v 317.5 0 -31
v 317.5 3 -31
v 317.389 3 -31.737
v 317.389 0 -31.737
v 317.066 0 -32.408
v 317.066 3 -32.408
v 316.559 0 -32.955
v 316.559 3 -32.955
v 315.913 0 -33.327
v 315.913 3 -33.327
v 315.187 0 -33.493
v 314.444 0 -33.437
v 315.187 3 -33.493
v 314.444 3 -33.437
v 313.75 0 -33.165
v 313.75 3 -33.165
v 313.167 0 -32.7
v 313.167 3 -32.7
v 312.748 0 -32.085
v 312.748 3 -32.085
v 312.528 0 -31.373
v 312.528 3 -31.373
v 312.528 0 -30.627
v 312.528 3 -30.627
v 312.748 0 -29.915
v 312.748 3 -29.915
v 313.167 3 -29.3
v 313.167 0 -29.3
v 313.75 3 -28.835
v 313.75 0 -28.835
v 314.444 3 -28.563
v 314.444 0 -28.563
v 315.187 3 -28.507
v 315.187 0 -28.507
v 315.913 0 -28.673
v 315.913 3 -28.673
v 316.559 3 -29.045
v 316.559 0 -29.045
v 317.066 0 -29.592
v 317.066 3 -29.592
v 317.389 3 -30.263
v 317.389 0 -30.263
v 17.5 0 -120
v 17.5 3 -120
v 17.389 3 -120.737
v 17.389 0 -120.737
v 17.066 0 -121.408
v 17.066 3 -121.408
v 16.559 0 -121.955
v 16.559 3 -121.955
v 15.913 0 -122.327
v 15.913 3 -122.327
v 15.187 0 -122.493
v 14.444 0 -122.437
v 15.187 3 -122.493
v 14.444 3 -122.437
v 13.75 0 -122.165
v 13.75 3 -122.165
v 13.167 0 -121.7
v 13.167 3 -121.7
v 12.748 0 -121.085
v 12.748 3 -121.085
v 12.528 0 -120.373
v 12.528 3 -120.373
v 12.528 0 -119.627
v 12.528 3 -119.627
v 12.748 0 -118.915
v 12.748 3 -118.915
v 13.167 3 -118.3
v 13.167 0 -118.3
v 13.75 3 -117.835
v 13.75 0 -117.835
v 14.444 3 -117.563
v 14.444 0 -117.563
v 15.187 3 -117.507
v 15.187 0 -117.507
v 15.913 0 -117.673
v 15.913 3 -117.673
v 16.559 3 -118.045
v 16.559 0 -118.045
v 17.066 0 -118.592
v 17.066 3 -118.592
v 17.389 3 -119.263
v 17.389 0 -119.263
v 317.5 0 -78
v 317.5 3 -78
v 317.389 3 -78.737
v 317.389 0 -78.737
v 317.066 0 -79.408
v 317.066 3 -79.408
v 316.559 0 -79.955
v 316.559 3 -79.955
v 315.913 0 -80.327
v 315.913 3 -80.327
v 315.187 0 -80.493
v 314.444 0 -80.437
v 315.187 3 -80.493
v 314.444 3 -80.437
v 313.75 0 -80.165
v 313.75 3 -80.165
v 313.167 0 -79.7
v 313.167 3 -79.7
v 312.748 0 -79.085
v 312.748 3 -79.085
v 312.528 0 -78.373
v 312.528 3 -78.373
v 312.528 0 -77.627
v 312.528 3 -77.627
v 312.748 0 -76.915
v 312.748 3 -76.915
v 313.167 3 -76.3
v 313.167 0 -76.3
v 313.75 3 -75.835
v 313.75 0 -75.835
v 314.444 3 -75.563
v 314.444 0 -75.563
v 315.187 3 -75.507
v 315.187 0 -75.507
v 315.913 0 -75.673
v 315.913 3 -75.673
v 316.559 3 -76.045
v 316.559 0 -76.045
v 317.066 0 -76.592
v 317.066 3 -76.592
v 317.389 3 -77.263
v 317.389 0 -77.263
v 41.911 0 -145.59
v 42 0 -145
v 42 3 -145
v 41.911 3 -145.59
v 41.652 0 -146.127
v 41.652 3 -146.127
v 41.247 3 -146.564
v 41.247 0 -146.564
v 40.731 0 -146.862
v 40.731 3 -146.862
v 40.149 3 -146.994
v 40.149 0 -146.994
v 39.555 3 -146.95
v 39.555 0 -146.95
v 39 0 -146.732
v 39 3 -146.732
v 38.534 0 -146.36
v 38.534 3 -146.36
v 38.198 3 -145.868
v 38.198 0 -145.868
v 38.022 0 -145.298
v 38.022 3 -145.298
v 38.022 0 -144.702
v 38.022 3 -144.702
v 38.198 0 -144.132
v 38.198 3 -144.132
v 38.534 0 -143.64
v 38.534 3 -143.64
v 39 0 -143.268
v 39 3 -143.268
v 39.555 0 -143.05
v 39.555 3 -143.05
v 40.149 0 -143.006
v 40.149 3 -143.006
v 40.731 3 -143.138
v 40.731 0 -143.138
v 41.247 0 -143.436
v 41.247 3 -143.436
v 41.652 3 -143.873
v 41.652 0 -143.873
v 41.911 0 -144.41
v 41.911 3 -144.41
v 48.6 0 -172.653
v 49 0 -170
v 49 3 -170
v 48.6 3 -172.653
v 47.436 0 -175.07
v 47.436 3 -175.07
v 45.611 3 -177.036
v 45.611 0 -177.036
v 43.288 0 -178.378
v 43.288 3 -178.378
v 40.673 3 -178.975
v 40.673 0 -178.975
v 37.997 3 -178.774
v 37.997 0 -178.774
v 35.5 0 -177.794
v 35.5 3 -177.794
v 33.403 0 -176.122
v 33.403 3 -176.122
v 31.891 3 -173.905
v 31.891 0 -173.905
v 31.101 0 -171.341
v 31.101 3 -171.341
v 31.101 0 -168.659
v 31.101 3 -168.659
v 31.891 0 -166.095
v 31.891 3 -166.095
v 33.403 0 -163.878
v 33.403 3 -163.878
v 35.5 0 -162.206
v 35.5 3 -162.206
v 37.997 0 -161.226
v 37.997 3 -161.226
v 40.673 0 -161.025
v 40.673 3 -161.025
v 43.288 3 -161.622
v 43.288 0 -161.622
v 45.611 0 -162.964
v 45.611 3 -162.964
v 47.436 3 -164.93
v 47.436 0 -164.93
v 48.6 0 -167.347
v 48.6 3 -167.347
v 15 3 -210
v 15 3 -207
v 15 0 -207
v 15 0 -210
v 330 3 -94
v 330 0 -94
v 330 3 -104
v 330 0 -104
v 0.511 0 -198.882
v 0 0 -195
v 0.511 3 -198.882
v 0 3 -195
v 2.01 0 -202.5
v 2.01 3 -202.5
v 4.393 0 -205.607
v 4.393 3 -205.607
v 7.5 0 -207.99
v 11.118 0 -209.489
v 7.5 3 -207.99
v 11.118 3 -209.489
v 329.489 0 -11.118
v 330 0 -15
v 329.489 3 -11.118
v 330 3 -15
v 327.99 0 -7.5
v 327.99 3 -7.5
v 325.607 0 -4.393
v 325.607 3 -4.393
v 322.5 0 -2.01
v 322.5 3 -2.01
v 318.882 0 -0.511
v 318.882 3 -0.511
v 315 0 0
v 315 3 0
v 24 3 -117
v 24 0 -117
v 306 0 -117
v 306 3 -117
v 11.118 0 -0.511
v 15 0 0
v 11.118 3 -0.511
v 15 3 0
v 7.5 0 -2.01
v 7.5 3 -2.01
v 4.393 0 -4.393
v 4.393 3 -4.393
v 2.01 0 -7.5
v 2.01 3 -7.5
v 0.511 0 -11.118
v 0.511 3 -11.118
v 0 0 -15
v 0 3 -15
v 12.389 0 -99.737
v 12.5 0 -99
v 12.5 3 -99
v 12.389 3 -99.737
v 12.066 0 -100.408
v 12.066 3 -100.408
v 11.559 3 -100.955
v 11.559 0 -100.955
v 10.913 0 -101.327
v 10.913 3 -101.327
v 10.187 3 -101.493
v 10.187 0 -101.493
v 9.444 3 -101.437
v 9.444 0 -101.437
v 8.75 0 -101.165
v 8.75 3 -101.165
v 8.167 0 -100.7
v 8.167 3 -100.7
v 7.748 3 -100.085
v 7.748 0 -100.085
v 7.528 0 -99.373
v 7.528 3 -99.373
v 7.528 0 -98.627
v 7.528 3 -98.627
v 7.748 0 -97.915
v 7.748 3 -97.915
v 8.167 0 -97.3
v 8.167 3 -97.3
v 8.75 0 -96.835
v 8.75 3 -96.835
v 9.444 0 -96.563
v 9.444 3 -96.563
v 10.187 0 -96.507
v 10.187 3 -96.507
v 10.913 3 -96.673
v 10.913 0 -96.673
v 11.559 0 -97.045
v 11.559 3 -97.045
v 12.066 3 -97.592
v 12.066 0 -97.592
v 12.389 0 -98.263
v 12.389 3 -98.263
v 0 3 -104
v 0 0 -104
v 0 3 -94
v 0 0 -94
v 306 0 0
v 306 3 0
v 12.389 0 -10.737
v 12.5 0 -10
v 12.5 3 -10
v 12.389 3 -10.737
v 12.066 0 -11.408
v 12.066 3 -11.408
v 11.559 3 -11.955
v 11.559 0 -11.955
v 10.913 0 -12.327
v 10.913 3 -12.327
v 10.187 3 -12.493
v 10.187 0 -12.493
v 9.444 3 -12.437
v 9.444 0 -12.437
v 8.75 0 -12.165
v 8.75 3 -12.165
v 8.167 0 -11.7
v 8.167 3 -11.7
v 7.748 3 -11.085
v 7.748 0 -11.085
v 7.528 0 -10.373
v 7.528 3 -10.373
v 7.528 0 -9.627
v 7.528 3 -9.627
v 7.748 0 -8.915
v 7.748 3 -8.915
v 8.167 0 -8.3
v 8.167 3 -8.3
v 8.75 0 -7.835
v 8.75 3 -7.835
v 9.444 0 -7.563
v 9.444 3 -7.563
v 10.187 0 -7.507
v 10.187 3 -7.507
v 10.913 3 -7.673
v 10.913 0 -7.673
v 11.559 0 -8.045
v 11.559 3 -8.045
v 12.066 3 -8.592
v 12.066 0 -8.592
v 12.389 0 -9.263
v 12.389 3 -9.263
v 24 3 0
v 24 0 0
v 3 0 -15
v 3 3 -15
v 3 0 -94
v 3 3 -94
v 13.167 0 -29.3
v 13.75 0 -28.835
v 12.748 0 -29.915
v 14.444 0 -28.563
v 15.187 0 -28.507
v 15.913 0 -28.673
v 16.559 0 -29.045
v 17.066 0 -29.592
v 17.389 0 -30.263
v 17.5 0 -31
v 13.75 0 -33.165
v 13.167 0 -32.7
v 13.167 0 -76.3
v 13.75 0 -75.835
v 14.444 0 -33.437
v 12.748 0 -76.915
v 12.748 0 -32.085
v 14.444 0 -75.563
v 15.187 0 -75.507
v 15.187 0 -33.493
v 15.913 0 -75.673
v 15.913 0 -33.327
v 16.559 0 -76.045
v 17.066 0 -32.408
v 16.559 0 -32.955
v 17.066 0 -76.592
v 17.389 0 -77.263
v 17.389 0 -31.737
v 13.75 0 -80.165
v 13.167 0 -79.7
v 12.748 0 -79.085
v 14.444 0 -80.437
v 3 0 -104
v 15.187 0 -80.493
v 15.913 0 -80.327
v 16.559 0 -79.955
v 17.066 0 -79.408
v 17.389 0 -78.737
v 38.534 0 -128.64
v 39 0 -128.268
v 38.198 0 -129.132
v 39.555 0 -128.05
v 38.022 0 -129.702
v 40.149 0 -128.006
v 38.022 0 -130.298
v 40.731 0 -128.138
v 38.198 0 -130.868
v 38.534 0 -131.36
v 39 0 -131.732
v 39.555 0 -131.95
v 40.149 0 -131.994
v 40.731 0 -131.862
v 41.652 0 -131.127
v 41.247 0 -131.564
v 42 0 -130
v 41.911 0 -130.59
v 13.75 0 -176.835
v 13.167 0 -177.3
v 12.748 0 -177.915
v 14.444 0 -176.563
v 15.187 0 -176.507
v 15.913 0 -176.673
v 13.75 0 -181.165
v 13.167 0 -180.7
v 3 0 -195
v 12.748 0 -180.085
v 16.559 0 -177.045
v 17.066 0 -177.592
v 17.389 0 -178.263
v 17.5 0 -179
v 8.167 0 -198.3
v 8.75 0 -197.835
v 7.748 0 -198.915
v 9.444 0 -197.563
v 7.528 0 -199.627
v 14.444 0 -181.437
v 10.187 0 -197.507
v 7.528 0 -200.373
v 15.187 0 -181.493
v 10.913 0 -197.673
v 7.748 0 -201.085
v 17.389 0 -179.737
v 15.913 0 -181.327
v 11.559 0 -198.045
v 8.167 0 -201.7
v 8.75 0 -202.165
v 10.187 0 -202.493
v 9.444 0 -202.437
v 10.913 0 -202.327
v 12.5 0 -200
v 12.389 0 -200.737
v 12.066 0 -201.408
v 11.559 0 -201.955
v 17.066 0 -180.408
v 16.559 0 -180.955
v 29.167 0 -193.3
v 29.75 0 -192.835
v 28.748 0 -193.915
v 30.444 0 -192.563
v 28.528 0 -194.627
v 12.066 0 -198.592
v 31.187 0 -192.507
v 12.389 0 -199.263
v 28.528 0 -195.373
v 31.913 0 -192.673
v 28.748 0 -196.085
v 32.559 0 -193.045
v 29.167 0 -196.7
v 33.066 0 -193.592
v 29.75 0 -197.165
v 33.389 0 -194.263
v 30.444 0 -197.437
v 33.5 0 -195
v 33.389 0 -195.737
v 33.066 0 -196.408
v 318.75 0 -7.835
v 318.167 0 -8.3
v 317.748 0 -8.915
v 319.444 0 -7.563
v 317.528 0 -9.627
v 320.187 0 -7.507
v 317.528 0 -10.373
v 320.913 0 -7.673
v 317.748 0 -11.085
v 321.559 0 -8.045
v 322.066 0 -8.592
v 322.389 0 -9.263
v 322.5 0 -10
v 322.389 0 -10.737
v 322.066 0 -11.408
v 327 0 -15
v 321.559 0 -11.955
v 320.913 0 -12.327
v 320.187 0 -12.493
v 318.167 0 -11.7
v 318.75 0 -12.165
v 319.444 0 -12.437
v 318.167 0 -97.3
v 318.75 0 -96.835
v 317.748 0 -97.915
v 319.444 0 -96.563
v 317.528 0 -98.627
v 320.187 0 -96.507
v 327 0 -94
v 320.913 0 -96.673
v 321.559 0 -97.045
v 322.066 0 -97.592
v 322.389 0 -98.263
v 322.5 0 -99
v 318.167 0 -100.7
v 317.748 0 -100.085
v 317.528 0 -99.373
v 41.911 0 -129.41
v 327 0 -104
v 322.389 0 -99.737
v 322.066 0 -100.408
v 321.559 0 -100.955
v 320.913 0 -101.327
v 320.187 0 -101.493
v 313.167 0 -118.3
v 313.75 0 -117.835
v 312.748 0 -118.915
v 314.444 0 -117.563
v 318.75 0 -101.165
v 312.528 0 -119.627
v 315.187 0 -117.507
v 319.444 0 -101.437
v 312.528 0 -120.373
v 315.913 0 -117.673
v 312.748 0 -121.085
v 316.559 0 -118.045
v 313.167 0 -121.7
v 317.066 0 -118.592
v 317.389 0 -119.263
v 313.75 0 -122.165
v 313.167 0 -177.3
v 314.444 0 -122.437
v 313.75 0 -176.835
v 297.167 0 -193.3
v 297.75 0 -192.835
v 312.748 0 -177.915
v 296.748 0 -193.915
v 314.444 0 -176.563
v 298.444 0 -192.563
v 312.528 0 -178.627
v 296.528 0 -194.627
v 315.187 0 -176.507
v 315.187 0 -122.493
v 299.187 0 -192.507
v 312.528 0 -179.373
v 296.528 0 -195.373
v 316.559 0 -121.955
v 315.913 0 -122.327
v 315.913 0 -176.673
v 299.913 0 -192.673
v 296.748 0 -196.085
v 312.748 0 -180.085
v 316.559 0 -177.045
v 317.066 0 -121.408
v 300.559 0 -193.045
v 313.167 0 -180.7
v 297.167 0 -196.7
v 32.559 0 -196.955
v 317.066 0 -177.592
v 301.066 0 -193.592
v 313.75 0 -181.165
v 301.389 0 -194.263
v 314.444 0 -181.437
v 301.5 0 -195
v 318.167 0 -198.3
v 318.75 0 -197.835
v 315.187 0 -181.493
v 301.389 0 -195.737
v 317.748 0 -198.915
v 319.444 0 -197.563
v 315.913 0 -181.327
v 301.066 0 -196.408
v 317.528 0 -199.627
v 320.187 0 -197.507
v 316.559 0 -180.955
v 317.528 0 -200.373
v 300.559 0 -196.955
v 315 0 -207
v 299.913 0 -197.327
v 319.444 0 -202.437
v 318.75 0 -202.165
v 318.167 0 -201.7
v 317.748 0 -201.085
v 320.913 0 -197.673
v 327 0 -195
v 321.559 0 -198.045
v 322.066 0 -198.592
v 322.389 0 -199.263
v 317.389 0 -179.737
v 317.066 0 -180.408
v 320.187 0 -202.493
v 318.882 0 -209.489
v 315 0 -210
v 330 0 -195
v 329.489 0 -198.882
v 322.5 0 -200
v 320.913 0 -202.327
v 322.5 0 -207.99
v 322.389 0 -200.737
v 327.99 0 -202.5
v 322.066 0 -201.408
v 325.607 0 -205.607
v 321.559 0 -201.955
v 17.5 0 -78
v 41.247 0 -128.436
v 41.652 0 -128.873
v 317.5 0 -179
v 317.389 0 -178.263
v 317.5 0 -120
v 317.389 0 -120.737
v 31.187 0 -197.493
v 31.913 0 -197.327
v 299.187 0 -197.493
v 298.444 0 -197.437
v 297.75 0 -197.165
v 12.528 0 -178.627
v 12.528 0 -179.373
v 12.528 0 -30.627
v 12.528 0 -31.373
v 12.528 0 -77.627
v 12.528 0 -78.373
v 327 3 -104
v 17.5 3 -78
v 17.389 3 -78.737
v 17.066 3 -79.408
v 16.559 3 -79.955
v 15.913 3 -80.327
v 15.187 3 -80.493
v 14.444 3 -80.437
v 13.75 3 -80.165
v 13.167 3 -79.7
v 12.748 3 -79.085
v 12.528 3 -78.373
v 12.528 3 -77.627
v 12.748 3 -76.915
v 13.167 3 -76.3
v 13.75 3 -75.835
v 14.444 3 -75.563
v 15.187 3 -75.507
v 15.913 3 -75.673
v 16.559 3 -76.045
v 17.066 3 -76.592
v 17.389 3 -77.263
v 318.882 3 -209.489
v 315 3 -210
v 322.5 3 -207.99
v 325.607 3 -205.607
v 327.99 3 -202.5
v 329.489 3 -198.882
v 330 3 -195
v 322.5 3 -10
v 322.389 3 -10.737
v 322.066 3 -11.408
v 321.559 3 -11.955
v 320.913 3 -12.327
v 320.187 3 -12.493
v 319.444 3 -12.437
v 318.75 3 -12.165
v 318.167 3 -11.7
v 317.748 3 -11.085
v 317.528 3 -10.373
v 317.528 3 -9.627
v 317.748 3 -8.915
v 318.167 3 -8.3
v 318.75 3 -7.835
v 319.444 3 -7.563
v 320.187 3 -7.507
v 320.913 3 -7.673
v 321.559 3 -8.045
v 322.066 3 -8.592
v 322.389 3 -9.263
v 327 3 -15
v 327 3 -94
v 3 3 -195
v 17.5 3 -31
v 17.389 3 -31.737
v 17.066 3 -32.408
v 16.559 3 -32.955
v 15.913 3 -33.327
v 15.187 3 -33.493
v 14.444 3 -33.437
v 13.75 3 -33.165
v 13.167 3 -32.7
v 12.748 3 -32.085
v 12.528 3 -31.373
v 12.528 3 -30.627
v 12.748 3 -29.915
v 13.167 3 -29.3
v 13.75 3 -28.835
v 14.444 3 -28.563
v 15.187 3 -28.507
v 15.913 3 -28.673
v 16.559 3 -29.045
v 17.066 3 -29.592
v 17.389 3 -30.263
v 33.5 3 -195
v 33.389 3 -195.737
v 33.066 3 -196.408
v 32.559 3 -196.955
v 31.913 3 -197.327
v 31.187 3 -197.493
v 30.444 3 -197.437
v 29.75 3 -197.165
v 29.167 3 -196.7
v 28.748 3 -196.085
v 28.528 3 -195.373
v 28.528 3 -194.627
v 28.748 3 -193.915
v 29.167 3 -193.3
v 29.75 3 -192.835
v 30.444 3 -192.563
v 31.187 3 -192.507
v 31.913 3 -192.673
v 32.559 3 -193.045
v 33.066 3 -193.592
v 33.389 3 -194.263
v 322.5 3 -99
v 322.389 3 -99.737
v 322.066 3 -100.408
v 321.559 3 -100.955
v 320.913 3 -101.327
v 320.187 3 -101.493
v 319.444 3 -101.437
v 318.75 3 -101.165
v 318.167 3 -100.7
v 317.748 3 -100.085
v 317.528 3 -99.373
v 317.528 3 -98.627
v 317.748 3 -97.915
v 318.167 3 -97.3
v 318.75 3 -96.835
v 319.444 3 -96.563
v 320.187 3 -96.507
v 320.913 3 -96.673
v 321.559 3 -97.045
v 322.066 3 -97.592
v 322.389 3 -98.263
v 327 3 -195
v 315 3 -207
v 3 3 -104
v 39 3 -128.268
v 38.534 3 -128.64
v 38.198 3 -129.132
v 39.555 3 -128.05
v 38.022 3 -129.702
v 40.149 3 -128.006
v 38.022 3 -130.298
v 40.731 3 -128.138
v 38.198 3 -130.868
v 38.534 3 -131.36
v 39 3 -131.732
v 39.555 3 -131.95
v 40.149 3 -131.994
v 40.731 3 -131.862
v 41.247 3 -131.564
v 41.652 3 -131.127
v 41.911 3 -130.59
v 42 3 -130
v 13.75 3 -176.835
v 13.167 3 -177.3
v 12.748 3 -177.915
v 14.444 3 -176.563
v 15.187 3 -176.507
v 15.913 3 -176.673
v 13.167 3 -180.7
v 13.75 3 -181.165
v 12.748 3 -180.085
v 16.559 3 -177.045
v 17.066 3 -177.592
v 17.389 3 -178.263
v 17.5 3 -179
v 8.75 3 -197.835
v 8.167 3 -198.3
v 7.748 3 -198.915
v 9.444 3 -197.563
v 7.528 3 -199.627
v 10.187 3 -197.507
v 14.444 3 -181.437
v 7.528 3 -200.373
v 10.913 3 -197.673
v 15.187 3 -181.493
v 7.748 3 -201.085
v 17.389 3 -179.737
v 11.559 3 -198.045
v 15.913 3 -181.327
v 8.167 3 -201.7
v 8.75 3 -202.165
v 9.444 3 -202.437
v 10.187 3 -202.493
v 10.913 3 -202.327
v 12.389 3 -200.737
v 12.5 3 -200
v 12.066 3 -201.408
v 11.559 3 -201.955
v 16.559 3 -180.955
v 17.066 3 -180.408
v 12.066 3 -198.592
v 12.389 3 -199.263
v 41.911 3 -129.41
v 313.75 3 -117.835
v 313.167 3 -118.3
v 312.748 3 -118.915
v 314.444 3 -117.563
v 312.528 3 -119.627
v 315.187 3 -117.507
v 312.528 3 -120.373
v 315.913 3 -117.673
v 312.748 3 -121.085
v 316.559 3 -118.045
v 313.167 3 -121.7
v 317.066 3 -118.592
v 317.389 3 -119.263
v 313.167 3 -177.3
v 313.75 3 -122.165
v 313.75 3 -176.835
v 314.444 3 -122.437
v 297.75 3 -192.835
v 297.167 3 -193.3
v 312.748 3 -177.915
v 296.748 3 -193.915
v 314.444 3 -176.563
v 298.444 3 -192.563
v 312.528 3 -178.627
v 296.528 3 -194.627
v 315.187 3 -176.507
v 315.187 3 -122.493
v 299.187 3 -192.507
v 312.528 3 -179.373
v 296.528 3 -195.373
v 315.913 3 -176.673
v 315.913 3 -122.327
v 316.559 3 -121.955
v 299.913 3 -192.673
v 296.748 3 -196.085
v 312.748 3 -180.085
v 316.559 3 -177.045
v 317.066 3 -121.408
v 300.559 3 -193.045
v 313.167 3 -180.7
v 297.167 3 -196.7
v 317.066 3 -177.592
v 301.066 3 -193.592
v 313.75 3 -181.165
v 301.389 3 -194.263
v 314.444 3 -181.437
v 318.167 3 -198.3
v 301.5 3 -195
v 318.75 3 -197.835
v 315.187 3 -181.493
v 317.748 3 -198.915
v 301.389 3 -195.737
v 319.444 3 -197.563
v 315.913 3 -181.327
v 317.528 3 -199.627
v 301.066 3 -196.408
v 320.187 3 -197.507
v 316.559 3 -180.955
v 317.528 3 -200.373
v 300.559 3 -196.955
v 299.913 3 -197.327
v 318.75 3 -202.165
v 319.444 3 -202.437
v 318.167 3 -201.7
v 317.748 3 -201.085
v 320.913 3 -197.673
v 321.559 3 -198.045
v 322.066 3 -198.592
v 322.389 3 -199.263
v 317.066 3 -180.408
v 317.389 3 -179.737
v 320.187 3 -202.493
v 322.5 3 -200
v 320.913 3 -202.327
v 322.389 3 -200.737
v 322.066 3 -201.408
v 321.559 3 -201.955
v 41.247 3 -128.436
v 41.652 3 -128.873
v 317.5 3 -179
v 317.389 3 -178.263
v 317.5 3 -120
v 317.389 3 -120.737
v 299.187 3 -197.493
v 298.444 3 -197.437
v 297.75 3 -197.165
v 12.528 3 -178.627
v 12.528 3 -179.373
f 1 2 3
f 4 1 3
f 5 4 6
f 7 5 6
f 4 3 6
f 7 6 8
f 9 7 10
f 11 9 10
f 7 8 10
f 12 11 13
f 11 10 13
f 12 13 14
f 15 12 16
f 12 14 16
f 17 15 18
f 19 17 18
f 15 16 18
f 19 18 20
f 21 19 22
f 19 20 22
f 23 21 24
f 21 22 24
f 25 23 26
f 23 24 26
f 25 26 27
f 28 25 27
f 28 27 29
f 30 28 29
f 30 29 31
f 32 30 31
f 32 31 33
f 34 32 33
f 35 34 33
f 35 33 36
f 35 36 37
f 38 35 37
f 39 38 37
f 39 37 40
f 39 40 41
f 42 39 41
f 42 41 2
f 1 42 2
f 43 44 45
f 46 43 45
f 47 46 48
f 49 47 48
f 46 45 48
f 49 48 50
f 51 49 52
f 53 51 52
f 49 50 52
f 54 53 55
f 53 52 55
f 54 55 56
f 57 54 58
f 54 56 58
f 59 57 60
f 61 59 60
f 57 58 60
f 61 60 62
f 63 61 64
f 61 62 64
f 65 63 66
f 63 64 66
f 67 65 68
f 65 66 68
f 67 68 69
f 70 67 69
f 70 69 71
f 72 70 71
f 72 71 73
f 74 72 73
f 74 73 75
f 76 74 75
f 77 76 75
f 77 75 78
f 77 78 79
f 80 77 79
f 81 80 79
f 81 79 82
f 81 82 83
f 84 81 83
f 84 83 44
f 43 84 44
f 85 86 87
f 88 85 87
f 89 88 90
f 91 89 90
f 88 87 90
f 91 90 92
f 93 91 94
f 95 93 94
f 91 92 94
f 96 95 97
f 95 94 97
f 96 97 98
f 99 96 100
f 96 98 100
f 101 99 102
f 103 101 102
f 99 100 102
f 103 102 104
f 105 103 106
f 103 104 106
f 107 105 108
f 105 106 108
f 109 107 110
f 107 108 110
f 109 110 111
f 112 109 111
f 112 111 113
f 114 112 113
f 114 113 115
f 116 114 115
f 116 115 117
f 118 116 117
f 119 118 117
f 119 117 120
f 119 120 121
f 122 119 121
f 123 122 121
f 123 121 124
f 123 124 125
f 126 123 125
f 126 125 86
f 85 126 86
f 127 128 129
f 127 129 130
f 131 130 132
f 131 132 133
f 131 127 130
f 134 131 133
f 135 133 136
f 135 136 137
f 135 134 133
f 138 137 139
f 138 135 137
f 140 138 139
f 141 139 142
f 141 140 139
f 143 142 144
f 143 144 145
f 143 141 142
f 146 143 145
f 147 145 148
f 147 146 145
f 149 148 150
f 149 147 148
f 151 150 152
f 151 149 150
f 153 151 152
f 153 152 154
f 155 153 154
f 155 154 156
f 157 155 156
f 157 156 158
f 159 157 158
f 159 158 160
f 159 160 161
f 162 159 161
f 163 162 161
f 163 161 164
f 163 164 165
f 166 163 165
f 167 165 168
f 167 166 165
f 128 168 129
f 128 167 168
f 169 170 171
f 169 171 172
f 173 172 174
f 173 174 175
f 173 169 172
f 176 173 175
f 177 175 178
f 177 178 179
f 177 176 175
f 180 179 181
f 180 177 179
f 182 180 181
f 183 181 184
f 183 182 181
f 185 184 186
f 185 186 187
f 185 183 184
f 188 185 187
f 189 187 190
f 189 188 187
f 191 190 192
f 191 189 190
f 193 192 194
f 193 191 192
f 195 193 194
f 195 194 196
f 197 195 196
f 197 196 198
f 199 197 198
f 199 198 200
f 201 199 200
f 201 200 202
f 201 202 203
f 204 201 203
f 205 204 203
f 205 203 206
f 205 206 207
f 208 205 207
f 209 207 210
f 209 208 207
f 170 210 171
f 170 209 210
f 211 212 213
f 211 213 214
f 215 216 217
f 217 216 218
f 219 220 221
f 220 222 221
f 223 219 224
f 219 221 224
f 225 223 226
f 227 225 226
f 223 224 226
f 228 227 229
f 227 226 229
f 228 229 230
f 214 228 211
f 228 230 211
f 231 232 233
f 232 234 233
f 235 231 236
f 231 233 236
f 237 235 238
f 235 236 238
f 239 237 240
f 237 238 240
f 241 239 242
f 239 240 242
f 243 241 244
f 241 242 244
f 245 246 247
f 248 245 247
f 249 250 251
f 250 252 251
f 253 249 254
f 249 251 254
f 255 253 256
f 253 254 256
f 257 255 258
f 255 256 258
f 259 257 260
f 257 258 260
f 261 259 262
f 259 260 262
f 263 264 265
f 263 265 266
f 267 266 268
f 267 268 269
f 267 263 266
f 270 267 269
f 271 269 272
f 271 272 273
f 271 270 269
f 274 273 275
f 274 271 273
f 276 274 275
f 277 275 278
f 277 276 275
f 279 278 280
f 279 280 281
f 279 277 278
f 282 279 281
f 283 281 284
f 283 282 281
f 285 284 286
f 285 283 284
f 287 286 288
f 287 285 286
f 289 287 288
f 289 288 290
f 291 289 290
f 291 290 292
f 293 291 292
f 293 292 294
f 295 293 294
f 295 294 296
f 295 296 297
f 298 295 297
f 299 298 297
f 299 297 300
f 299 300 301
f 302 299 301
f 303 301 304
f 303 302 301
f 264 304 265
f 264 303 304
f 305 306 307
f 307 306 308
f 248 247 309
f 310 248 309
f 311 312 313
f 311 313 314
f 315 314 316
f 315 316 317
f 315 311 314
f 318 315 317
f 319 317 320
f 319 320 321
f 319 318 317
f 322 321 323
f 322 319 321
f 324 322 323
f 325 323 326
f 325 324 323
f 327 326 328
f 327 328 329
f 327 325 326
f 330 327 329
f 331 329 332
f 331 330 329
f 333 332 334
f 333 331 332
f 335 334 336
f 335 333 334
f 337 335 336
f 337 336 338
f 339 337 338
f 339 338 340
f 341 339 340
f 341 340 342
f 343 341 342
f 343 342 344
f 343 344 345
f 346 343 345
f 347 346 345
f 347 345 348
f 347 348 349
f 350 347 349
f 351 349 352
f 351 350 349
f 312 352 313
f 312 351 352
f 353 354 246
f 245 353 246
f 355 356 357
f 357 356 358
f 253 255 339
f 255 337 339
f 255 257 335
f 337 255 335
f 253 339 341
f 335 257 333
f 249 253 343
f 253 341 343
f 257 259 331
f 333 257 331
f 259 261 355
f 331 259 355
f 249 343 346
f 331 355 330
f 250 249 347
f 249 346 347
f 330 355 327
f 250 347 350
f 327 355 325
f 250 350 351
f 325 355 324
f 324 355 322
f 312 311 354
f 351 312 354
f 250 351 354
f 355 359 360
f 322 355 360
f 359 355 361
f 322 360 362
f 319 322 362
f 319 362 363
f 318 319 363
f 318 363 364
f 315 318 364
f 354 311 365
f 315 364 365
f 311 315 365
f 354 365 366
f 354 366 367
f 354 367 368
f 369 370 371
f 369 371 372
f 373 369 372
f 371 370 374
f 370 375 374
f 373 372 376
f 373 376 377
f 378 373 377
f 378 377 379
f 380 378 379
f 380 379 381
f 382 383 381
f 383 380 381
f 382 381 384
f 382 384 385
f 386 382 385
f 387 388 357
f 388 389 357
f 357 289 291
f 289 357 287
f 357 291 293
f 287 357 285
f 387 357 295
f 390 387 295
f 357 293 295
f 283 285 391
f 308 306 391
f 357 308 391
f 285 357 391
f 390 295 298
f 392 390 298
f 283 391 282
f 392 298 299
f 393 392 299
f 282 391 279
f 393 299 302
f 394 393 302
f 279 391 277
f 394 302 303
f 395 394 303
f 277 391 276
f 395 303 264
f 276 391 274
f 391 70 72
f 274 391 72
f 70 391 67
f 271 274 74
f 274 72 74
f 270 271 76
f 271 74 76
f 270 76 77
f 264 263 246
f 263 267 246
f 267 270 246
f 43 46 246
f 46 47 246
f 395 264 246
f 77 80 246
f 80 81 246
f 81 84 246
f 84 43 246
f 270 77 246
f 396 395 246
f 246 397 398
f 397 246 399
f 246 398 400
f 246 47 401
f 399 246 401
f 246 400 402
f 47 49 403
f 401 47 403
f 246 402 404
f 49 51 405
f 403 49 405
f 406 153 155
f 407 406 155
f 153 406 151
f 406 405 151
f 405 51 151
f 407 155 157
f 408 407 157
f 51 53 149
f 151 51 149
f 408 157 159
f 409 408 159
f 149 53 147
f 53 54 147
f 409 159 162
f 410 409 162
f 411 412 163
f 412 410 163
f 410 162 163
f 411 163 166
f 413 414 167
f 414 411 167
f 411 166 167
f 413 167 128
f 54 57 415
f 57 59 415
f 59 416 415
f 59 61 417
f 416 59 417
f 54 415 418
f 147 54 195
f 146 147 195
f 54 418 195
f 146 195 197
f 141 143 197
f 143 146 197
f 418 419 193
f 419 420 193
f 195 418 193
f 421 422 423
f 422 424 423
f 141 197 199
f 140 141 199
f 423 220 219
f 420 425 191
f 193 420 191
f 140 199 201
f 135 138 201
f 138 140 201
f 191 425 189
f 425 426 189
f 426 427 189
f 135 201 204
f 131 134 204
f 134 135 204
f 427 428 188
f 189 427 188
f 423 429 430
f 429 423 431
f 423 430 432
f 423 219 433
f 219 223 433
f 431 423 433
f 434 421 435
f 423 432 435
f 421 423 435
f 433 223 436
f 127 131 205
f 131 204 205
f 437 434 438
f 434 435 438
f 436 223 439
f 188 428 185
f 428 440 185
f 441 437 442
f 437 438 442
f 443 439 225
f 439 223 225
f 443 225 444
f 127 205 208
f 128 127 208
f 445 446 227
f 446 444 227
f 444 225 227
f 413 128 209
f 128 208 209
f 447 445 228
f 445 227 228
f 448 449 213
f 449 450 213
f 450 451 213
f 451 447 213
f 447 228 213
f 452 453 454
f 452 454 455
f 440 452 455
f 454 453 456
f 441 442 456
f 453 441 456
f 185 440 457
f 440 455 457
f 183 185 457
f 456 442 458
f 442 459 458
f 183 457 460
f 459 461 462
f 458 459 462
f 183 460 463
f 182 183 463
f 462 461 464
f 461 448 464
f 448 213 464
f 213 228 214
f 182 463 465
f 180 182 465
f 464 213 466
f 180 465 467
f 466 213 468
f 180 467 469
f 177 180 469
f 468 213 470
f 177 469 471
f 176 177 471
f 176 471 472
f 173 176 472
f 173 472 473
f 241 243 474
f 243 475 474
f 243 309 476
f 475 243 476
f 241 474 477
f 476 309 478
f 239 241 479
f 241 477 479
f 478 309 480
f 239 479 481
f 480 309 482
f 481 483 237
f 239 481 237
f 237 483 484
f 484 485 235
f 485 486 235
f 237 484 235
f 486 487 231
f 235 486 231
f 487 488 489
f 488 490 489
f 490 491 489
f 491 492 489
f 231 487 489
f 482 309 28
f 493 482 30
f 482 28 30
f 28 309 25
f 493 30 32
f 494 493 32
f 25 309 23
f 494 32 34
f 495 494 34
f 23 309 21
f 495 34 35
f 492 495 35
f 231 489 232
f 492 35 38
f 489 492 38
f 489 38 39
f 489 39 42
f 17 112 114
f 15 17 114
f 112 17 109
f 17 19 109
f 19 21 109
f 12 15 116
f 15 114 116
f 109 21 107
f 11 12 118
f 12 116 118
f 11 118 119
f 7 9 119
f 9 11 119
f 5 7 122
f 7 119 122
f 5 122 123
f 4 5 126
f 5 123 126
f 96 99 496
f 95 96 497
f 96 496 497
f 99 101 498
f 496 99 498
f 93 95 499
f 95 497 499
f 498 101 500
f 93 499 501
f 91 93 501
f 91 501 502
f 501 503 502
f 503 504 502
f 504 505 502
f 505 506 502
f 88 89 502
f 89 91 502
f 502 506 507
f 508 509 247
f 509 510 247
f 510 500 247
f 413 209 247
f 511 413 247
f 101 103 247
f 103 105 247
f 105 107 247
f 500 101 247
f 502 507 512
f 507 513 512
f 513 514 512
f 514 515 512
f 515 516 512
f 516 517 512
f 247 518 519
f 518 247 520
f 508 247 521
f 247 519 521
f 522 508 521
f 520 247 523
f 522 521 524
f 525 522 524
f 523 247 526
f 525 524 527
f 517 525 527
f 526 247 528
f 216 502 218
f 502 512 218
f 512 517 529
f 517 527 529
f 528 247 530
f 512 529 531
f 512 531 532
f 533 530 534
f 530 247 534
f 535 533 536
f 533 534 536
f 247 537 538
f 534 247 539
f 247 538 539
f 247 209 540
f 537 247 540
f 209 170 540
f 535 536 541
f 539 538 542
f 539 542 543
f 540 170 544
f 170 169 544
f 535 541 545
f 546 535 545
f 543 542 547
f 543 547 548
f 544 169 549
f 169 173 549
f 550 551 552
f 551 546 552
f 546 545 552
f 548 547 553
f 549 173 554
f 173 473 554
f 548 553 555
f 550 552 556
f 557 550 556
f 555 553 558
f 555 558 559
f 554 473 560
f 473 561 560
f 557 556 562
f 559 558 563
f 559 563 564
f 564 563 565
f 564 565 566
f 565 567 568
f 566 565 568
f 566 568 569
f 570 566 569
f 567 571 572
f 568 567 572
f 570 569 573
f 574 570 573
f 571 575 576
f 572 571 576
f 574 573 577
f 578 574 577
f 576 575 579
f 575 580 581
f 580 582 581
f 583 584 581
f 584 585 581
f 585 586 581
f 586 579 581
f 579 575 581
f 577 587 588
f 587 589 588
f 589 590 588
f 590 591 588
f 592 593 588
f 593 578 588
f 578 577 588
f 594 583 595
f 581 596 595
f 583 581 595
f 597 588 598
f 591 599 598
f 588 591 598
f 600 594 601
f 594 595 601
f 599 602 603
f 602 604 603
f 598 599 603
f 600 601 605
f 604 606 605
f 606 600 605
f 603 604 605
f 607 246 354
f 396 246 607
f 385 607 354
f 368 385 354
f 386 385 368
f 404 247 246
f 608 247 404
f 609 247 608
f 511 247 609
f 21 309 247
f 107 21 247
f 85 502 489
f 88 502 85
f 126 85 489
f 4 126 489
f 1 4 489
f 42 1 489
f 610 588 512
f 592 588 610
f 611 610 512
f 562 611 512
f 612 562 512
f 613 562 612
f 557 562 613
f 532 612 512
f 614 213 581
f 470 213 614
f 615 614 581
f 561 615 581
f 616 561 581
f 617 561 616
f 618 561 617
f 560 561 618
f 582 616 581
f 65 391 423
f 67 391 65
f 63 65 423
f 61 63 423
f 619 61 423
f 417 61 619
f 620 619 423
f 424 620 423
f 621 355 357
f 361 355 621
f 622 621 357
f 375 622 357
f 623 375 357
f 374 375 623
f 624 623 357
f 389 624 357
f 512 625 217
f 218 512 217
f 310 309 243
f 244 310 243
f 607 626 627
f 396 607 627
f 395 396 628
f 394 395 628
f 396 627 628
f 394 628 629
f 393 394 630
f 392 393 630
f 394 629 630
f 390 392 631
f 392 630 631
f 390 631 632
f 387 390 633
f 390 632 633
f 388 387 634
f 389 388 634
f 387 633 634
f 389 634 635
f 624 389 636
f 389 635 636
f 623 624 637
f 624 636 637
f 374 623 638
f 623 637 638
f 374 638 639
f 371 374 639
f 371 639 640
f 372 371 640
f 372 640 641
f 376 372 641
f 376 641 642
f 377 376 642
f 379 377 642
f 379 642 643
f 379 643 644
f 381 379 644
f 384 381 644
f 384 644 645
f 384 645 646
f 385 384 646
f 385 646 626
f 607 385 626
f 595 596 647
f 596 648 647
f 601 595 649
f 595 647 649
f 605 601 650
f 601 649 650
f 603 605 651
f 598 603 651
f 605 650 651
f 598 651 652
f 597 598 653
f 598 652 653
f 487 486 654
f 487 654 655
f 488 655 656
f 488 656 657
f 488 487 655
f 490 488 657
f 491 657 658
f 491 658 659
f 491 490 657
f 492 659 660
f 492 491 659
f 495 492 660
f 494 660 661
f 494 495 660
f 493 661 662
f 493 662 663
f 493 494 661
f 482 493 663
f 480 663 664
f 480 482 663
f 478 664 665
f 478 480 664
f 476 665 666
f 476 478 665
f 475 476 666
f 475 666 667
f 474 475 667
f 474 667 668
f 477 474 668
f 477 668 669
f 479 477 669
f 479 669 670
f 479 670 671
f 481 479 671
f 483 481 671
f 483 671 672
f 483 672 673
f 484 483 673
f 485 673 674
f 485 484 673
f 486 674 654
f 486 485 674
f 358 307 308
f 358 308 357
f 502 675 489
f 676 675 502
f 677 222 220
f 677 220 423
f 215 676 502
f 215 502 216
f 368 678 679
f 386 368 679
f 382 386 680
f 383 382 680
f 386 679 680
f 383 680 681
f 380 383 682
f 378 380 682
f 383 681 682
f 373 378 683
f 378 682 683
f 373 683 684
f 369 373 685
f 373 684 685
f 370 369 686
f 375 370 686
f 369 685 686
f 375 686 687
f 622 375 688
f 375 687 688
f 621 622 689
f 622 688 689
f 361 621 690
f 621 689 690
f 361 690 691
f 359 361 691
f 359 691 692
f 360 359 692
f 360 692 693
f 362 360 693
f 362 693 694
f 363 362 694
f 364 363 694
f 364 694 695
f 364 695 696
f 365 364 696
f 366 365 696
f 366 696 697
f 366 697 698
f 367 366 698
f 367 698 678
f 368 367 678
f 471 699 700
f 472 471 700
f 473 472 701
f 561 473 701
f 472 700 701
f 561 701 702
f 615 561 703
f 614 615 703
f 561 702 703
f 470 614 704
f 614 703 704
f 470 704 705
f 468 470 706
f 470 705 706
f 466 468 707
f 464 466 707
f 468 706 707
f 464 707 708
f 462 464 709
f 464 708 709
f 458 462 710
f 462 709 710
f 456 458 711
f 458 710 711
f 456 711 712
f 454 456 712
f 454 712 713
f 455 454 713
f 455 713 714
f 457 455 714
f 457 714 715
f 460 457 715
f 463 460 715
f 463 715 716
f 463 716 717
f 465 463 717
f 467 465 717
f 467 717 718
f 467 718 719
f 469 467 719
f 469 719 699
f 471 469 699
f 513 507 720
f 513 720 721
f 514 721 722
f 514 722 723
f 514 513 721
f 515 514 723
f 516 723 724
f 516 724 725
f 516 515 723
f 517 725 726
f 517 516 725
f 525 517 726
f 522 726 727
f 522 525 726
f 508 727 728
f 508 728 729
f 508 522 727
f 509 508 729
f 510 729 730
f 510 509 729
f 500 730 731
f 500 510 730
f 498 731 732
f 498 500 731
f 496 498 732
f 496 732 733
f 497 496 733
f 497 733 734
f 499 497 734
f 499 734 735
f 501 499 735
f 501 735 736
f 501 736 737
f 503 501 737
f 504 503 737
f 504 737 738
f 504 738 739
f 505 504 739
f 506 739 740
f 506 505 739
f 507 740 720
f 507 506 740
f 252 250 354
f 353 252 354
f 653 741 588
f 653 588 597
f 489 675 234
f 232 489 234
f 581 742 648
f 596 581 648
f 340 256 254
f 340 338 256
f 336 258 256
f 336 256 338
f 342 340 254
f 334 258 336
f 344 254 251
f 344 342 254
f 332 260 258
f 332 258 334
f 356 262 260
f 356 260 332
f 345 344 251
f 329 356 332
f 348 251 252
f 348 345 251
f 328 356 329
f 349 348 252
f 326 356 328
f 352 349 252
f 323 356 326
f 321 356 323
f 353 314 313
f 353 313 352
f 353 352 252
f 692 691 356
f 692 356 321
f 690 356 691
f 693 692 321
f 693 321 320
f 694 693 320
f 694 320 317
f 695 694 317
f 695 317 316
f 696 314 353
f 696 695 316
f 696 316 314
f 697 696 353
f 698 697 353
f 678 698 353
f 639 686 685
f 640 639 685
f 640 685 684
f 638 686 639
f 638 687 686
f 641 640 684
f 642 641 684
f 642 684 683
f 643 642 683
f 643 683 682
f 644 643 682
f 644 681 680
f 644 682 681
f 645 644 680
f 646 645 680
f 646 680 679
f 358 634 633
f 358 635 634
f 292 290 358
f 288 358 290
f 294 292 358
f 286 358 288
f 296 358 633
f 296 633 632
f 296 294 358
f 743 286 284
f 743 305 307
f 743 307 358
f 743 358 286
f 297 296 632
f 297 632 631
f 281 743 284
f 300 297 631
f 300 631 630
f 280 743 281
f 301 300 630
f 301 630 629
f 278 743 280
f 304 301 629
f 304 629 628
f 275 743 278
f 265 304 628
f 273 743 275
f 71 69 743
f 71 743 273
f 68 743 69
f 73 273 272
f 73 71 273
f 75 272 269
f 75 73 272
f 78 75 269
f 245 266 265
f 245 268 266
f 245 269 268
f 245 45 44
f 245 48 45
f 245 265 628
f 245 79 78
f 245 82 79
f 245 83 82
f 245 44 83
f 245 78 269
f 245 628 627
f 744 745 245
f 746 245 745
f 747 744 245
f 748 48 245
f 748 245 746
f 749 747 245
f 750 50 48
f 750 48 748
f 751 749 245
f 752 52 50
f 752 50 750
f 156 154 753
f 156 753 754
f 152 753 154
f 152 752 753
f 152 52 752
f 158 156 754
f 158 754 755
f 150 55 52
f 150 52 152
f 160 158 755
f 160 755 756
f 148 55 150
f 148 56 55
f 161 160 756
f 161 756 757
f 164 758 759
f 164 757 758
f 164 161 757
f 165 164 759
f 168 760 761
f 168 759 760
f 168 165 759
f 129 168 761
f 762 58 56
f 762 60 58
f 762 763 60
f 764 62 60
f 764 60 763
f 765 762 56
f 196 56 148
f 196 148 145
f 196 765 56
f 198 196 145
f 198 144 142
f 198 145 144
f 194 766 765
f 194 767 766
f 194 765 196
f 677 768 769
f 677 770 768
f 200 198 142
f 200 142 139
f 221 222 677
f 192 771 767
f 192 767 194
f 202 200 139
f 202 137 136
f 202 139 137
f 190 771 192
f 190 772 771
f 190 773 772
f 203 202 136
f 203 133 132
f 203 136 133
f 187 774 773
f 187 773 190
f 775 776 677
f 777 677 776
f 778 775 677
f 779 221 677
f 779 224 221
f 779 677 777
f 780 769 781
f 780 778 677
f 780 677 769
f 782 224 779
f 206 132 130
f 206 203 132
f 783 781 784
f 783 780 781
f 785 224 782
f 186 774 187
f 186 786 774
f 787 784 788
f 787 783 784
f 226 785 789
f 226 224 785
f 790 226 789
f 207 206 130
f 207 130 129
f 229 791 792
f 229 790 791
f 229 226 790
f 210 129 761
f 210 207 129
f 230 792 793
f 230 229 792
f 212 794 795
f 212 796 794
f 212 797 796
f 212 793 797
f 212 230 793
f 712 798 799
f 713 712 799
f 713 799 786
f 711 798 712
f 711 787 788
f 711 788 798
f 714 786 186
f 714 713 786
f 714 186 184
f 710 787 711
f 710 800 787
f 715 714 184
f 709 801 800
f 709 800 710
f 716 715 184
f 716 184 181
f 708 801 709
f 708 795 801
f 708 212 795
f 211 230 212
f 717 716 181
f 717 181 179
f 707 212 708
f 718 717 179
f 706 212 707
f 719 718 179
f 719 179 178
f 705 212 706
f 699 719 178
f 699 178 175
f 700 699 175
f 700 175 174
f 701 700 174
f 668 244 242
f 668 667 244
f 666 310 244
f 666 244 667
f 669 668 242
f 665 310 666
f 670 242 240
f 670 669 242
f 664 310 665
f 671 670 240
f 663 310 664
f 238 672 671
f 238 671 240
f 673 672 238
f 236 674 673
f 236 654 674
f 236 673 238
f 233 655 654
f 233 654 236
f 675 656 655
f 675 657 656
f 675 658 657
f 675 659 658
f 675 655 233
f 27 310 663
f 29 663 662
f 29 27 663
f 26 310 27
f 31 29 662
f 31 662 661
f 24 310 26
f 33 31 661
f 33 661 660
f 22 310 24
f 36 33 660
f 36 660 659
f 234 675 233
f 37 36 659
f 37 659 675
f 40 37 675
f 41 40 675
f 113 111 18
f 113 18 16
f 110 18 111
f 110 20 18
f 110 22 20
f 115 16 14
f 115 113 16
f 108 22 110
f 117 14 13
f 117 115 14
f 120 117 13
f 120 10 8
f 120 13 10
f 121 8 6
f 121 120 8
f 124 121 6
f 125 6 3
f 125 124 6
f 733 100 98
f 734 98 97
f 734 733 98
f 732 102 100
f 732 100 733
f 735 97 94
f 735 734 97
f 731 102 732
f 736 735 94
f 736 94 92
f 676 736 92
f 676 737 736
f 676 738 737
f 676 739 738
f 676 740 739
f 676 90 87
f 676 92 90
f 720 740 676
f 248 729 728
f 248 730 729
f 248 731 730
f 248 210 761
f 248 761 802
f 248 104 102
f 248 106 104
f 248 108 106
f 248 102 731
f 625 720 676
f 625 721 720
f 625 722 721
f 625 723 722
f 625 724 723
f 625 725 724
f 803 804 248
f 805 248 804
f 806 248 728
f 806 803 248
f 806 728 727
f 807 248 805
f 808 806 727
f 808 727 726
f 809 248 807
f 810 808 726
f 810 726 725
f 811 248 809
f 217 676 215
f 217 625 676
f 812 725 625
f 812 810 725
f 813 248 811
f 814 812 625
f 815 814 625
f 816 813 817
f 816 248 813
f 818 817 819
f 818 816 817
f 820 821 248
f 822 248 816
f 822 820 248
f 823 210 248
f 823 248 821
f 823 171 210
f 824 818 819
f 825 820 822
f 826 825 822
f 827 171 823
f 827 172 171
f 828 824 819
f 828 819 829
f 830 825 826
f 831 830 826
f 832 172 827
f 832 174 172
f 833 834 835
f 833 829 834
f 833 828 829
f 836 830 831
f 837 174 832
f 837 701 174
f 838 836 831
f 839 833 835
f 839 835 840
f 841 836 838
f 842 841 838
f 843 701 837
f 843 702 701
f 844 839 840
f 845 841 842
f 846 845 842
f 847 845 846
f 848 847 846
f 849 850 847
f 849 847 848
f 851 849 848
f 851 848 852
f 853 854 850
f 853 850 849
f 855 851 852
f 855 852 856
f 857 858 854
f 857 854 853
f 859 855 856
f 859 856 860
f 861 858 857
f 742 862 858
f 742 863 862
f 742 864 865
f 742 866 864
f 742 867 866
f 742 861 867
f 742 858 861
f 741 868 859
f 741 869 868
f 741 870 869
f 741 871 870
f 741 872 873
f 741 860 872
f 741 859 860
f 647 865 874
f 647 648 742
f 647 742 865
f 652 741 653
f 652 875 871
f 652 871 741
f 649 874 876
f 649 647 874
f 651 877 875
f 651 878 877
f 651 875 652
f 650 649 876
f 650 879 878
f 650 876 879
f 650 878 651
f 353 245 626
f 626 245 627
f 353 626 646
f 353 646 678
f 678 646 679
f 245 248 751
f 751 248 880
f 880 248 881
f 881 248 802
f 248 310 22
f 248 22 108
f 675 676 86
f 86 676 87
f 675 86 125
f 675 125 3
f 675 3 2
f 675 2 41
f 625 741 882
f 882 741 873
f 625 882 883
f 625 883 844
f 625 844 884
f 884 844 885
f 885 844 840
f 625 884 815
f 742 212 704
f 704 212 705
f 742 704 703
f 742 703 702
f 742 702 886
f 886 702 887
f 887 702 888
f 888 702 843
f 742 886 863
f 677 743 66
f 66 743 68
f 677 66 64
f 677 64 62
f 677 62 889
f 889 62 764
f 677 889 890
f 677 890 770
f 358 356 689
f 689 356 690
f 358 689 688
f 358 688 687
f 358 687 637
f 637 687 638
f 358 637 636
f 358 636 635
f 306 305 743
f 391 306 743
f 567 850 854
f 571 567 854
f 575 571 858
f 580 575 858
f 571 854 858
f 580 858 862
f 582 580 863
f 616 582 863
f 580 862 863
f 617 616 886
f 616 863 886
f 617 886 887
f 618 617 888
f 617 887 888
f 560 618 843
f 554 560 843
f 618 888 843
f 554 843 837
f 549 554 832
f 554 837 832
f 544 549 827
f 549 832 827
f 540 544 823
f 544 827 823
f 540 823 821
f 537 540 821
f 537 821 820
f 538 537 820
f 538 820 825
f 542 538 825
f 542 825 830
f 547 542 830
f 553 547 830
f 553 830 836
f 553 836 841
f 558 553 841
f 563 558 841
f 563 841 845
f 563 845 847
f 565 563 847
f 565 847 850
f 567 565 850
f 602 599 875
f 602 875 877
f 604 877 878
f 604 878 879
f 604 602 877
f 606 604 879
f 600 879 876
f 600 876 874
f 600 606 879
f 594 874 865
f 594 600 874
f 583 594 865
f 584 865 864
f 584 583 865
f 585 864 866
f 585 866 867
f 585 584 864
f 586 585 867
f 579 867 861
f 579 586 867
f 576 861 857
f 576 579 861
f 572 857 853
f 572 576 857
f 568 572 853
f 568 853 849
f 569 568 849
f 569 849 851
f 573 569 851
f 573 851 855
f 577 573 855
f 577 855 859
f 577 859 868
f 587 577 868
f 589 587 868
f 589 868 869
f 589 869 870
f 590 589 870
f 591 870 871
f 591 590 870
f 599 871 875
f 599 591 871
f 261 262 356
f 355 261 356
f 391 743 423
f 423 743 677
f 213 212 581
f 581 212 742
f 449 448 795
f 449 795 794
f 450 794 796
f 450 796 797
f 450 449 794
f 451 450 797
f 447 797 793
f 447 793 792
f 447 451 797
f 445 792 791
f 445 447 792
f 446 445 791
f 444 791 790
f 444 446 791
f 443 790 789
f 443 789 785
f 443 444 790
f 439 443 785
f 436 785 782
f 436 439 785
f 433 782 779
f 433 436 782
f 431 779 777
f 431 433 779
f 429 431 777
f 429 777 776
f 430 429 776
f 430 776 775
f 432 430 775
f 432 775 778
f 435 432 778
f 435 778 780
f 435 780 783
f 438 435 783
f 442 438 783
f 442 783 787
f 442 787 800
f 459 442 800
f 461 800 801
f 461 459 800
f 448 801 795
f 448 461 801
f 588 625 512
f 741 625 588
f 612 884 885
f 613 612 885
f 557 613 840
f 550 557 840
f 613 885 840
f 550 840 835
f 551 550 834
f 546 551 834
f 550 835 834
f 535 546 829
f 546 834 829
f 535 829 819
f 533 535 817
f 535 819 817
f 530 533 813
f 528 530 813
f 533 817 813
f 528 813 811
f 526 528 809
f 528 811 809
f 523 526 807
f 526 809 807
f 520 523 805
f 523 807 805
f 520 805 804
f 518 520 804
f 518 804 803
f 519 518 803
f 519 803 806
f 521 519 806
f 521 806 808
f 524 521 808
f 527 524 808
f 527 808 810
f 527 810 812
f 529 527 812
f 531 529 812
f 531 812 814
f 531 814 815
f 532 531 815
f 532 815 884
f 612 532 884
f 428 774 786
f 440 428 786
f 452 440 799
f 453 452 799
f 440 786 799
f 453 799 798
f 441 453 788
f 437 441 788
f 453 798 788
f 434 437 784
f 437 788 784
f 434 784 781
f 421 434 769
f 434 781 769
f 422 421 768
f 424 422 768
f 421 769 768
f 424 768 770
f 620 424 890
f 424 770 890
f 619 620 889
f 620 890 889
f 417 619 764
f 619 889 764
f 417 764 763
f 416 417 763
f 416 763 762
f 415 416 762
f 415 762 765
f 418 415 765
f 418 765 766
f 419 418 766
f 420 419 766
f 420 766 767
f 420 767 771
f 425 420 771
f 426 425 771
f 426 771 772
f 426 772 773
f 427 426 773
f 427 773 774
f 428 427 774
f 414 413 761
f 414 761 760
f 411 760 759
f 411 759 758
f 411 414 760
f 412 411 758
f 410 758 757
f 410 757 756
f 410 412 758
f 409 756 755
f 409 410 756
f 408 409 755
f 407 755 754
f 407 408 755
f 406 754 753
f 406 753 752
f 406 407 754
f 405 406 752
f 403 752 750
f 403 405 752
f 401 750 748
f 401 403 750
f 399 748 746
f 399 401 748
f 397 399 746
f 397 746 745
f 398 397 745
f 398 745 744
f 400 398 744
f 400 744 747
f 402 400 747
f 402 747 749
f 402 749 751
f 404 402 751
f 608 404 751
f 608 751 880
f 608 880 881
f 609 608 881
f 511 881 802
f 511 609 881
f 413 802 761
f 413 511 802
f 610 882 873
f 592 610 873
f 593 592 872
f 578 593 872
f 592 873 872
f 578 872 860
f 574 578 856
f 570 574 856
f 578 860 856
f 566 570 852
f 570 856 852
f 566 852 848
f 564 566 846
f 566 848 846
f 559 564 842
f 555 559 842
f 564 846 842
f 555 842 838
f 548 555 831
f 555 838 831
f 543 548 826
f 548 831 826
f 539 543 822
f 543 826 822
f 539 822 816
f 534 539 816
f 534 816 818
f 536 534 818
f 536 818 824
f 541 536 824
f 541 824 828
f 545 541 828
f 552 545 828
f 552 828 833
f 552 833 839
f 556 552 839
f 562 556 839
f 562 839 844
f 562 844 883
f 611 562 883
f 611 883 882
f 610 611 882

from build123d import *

# Parameters (mm, degrees)
ESQUISSE1_R      = 2.5
ESQUISSE1_R_2    = 9
ESQUISSE1_R_3    = 2
EXTRUSION1_DEPTH = 3
CONG_1_R         = 15
EXTRUSION2_REACH = 5
ESQUISSE2_W      = 300
ESQUISSE2_H      = 3
ESQUISSE2_W_2    = 3
ESQUISSE2_H_2    = 91
ESQUISSE2_H_3    = 79
EXTRUSION3_REACH = 5
ESQUISSE3_R      = 2.5


with BuildPart() as part:
    # Esquisse1 → Extrusion1 (new body)
    with BuildSketch(Plane(origin=(0, 0, 0), x_dir=(1, 0, 0), z_dir=(0, 1, 0))):
        Polygon((0, 0), (24, 0), (24, 117), (165, 117), (306, 117), (306, 0), (330, 0), (330, 210), (0, 210), align=None)
        with Locations((10, 200)):
            Circle(ESQUISSE1_R, mode=Mode.SUBTRACT)
        with Locations((320, 200)):
            Circle(ESQUISSE1_R, mode=Mode.SUBTRACT)
        with Locations((10, 99)):
            Circle(ESQUISSE1_R, mode=Mode.SUBTRACT)
        with Locations((320, 99)):
            Circle(ESQUISSE1_R, mode=Mode.SUBTRACT)
        with Locations((10, 10)):
            Circle(ESQUISSE1_R, mode=Mode.SUBTRACT)
        with Locations((320, 10)):
            Circle(ESQUISSE1_R, mode=Mode.SUBTRACT)
        with Locations((40, 170)):
            Circle(ESQUISSE1_R_2, mode=Mode.SUBTRACT)
        with Locations((40, 145)):
            Circle(ESQUISSE1_R_3, mode=Mode.SUBTRACT)
        with Locations((40, 130)):
            Circle(ESQUISSE1_R_3, mode=Mode.SUBTRACT)
    extrude(amount=EXTRUSION1_DEPTH)

    # Congé1
    cong_1_edges = [part.edges().sort_by_distance(p)[0] for p in [
        (0, 1.5, -210),
        (330, 1.5, -210),
        (330, 1.5, 0),
        (0, 1.5, 0),
    ]]
    fillet(cong_1_edges, radius=CONG_1_R)

    # Esquisse2 → Extrusion2 (cut, up to next)
    with BuildSketch(Plane(origin=(0, 3, 0), x_dir=(1, 0, 0), z_dir=(0, 1, 0)), mode=Mode.PRIVATE) as extrusion2_sk1:
        with Locations((165, 208.5)):
            Rectangle(ESQUISSE2_W, ESQUISSE2_H)
    extrusion2_tool1 = extrude(extrusion2_sk1.sketch, amount=-EXTRUSION2_REACH, mode=Mode.PRIVATE) & part.part
    add(extrusion2_tool1.solids().sort_by_distance((165, 3, -208.5))[0], mode=Mode.SUBTRACT)
    # Esquisse2 → Extrusion2 (cut, up to next)
    with BuildSketch(Plane(origin=(0, 3, 0), x_dir=(1, 0, 0), z_dir=(0, 1, 0)), mode=Mode.PRIVATE) as extrusion2_sk2:
        with Locations((1.5, 149.5)):
            Rectangle(ESQUISSE2_W_2, ESQUISSE2_H_2)
    extrusion2_tool2 = extrude(extrusion2_sk2.sketch, amount=-EXTRUSION2_REACH, mode=Mode.PRIVATE) & part.part
    add(extrusion2_tool2.solids().sort_by_distance((1.5, 3, -149.5))[0], mode=Mode.SUBTRACT)
    # Esquisse2 → Extrusion2 (cut, up to next)
    with BuildSketch(Plane(origin=(0, 3, 0), x_dir=(1, 0, 0), z_dir=(0, 1, 0)), mode=Mode.PRIVATE) as extrusion2_sk3:
        with Locations((1.5, 54.5)):
            Rectangle(ESQUISSE2_W_2, ESQUISSE2_H_3)
    extrusion2_tool3 = extrude(extrusion2_sk3.sketch, amount=-EXTRUSION2_REACH, mode=Mode.PRIVATE) & part.part
    add(extrusion2_tool3.solids().sort_by_distance((1.5, 3, -54.5))[0], mode=Mode.SUBTRACT)
    # Esquisse2 → Extrusion2 (cut, up to next)
    with BuildSketch(Plane(origin=(0, 3, 0), x_dir=(1, 0, 0), z_dir=(0, 1, 0)), mode=Mode.PRIVATE) as extrusion2_sk4:
        with Locations((328.5, 54.5)):
            Rectangle(ESQUISSE2_W_2, ESQUISSE2_H_3)
    extrusion2_tool4 = extrude(extrusion2_sk4.sketch, amount=-EXTRUSION2_REACH, mode=Mode.PRIVATE) & part.part
    add(extrusion2_tool4.solids().sort_by_distance((328.5, 3, -54.5))[0], mode=Mode.SUBTRACT)
    # Esquisse2 → Extrusion2 (cut, up to next)
    with BuildSketch(Plane(origin=(0, 3, 0), x_dir=(1, 0, 0), z_dir=(0, 1, 0)), mode=Mode.PRIVATE) as extrusion2_sk5:
        with Locations((328.5, 149.5)):
            Rectangle(ESQUISSE2_W_2, ESQUISSE2_H_2)
    extrusion2_tool5 = extrude(extrusion2_sk5.sketch, amount=-EXTRUSION2_REACH, mode=Mode.PRIVATE) & part.part
    add(extrusion2_tool5.solids().sort_by_distance((328.5, 3, -149.5))[0], mode=Mode.SUBTRACT)

    # Esquisse3 → Extrusion3 (cut, up to next)
    with BuildSketch(Plane(origin=(0, 3, 0), x_dir=(1, 0, 0), z_dir=(0, 1, 0)), mode=Mode.PRIVATE) as extrusion3_sk1:
        with Locations((31, 195)):
            Circle(ESQUISSE3_R)
    extrusion3_tool1 = extrude(extrusion3_sk1.sketch, amount=-EXTRUSION3_REACH, mode=Mode.PRIVATE) & part.part
    add(extrusion3_tool1.solids().sort_by_distance((31, 3, -195))[0], mode=Mode.SUBTRACT)
    # Esquisse3 → Extrusion3 (cut, up to next)
    with BuildSketch(Plane(origin=(0, 3, 0), x_dir=(1, 0, 0), z_dir=(0, 1, 0)), mode=Mode.PRIVATE) as extrusion3_sk2:
        with Locations((15, 179)):
            Circle(ESQUISSE3_R)
    extrusion3_tool2 = extrude(extrusion3_sk2.sketch, amount=-EXTRUSION3_REACH, mode=Mode.PRIVATE) & part.part
    add(extrusion3_tool2.solids().sort_by_distance((15, 3, -179))[0], mode=Mode.SUBTRACT)
    # Esquisse3 → Extrusion3 (cut, up to next)
    with BuildSketch(Plane(origin=(0, 3, 0), x_dir=(1, 0, 0), z_dir=(0, 1, 0)), mode=Mode.PRIVATE) as extrusion3_sk3:
        with Locations((15, 120)):
            Circle(ESQUISSE3_R)
    extrusion3_tool3 = extrude(extrusion3_sk3.sketch, amount=-EXTRUSION3_REACH, mode=Mode.PRIVATE) & part.part
    add(extrusion3_tool3.solids().sort_by_distance((15, 3, -120))[0], mode=Mode.SUBTRACT)
    # Esquisse3 → Extrusion3 (cut, up to next)
    with BuildSketch(Plane(origin=(0, 3, 0), x_dir=(1, 0, 0), z_dir=(0, 1, 0)), mode=Mode.PRIVATE) as extrusion3_sk4:
        with Locations((15, 78)):
            Circle(ESQUISSE3_R)
    extrusion3_tool4 = extrude(extrusion3_sk4.sketch, amount=-EXTRUSION3_REACH, mode=Mode.PRIVATE) & part.part
    add(extrusion3_tool4.solids().sort_by_distance((15, 3, -78))[0], mode=Mode.SUBTRACT)
    # Esquisse3 → Extrusion3 (cut, up to next)
    with BuildSketch(Plane(origin=(0, 3, 0), x_dir=(1, 0, 0), z_dir=(0, 1, 0)), mode=Mode.PRIVATE) as extrusion3_sk5:
        with Locations((15, 31)):
            Circle(ESQUISSE3_R)
    extrusion3_tool5 = extrude(extrusion3_sk5.sketch, amount=-EXTRUSION3_REACH, mode=Mode.PRIVATE) & part.part
    add(extrusion3_tool5.solids().sort_by_distance((15, 3, -31))[0], mode=Mode.SUBTRACT)
    # Esquisse3 → Extrusion3 (cut, up to next)
    with BuildSketch(Plane(origin=(0, 3, 0), x_dir=(1, 0, 0), z_dir=(0, 1, 0)), mode=Mode.PRIVATE) as extrusion3_sk6:
        with Locations((299, 195)):
            Circle(ESQUISSE3_R)
    extrusion3_tool6 = extrude(extrusion3_sk6.sketch, amount=-EXTRUSION3_REACH, mode=Mode.PRIVATE) & part.part
    add(extrusion3_tool6.solids().sort_by_distance((299, 3, -195))[0], mode=Mode.SUBTRACT)
    # Esquisse3 → Extrusion3 (cut, up to next)
    with BuildSketch(Plane(origin=(0, 3, 0), x_dir=(1, 0, 0), z_dir=(0, 1, 0)), mode=Mode.PRIVATE) as extrusion3_sk7:
        with Locations((315, 179)):
            Circle(ESQUISSE3_R)
    extrusion3_tool7 = extrude(extrusion3_sk7.sketch, amount=-EXTRUSION3_REACH, mode=Mode.PRIVATE) & part.part
    add(extrusion3_tool7.solids().sort_by_distance((315, 3, -179))[0], mode=Mode.SUBTRACT)
    # Esquisse3 → Extrusion3 (cut, up to next)
    with BuildSketch(Plane(origin=(0, 3, 0), x_dir=(1, 0, 0), z_dir=(0, 1, 0)), mode=Mode.PRIVATE) as extrusion3_sk8:
        with Locations((315, 120)):
            Circle(ESQUISSE3_R)
    extrusion3_tool8 = extrude(extrusion3_sk8.sketch, amount=-EXTRUSION3_REACH, mode=Mode.PRIVATE) & part.part
    add(extrusion3_tool8.solids().sort_by_distance((315, 3, -120))[0], mode=Mode.SUBTRACT)
    # Esquisse3 → Extrusion3 (cut, up to next)
    with BuildSketch(Plane(origin=(0, 3, 0), x_dir=(1, 0, 0), z_dir=(0, 1, 0)), mode=Mode.PRIVATE) as extrusion3_sk9:
        with Locations((315, 78)):
            Circle(ESQUISSE3_R)
    extrusion3_tool9 = extrude(extrusion3_sk9.sketch, amount=-EXTRUSION3_REACH, mode=Mode.PRIVATE) & part.part
    add(extrusion3_tool9.solids().sort_by_distance((315, 3, -78))[0], mode=Mode.SUBTRACT)
    # Esquisse3 → Extrusion3 (cut, up to next)
    with BuildSketch(Plane(origin=(0, 3, 0), x_dir=(1, 0, 0), z_dir=(0, 1, 0)), mode=Mode.PRIVATE) as extrusion3_sk10:
        with Locations((315, 31)):
            Circle(ESQUISSE3_R)
    extrusion3_tool10 = extrude(extrusion3_sk10.sketch, amount=-EXTRUSION3_REACH, mode=Mode.PRIVATE) & part.part
    add(extrusion3_tool10.solids().sort_by_distance((315, 3, -31))[0], mode=Mode.SUBTRACT)


solid = part.part
